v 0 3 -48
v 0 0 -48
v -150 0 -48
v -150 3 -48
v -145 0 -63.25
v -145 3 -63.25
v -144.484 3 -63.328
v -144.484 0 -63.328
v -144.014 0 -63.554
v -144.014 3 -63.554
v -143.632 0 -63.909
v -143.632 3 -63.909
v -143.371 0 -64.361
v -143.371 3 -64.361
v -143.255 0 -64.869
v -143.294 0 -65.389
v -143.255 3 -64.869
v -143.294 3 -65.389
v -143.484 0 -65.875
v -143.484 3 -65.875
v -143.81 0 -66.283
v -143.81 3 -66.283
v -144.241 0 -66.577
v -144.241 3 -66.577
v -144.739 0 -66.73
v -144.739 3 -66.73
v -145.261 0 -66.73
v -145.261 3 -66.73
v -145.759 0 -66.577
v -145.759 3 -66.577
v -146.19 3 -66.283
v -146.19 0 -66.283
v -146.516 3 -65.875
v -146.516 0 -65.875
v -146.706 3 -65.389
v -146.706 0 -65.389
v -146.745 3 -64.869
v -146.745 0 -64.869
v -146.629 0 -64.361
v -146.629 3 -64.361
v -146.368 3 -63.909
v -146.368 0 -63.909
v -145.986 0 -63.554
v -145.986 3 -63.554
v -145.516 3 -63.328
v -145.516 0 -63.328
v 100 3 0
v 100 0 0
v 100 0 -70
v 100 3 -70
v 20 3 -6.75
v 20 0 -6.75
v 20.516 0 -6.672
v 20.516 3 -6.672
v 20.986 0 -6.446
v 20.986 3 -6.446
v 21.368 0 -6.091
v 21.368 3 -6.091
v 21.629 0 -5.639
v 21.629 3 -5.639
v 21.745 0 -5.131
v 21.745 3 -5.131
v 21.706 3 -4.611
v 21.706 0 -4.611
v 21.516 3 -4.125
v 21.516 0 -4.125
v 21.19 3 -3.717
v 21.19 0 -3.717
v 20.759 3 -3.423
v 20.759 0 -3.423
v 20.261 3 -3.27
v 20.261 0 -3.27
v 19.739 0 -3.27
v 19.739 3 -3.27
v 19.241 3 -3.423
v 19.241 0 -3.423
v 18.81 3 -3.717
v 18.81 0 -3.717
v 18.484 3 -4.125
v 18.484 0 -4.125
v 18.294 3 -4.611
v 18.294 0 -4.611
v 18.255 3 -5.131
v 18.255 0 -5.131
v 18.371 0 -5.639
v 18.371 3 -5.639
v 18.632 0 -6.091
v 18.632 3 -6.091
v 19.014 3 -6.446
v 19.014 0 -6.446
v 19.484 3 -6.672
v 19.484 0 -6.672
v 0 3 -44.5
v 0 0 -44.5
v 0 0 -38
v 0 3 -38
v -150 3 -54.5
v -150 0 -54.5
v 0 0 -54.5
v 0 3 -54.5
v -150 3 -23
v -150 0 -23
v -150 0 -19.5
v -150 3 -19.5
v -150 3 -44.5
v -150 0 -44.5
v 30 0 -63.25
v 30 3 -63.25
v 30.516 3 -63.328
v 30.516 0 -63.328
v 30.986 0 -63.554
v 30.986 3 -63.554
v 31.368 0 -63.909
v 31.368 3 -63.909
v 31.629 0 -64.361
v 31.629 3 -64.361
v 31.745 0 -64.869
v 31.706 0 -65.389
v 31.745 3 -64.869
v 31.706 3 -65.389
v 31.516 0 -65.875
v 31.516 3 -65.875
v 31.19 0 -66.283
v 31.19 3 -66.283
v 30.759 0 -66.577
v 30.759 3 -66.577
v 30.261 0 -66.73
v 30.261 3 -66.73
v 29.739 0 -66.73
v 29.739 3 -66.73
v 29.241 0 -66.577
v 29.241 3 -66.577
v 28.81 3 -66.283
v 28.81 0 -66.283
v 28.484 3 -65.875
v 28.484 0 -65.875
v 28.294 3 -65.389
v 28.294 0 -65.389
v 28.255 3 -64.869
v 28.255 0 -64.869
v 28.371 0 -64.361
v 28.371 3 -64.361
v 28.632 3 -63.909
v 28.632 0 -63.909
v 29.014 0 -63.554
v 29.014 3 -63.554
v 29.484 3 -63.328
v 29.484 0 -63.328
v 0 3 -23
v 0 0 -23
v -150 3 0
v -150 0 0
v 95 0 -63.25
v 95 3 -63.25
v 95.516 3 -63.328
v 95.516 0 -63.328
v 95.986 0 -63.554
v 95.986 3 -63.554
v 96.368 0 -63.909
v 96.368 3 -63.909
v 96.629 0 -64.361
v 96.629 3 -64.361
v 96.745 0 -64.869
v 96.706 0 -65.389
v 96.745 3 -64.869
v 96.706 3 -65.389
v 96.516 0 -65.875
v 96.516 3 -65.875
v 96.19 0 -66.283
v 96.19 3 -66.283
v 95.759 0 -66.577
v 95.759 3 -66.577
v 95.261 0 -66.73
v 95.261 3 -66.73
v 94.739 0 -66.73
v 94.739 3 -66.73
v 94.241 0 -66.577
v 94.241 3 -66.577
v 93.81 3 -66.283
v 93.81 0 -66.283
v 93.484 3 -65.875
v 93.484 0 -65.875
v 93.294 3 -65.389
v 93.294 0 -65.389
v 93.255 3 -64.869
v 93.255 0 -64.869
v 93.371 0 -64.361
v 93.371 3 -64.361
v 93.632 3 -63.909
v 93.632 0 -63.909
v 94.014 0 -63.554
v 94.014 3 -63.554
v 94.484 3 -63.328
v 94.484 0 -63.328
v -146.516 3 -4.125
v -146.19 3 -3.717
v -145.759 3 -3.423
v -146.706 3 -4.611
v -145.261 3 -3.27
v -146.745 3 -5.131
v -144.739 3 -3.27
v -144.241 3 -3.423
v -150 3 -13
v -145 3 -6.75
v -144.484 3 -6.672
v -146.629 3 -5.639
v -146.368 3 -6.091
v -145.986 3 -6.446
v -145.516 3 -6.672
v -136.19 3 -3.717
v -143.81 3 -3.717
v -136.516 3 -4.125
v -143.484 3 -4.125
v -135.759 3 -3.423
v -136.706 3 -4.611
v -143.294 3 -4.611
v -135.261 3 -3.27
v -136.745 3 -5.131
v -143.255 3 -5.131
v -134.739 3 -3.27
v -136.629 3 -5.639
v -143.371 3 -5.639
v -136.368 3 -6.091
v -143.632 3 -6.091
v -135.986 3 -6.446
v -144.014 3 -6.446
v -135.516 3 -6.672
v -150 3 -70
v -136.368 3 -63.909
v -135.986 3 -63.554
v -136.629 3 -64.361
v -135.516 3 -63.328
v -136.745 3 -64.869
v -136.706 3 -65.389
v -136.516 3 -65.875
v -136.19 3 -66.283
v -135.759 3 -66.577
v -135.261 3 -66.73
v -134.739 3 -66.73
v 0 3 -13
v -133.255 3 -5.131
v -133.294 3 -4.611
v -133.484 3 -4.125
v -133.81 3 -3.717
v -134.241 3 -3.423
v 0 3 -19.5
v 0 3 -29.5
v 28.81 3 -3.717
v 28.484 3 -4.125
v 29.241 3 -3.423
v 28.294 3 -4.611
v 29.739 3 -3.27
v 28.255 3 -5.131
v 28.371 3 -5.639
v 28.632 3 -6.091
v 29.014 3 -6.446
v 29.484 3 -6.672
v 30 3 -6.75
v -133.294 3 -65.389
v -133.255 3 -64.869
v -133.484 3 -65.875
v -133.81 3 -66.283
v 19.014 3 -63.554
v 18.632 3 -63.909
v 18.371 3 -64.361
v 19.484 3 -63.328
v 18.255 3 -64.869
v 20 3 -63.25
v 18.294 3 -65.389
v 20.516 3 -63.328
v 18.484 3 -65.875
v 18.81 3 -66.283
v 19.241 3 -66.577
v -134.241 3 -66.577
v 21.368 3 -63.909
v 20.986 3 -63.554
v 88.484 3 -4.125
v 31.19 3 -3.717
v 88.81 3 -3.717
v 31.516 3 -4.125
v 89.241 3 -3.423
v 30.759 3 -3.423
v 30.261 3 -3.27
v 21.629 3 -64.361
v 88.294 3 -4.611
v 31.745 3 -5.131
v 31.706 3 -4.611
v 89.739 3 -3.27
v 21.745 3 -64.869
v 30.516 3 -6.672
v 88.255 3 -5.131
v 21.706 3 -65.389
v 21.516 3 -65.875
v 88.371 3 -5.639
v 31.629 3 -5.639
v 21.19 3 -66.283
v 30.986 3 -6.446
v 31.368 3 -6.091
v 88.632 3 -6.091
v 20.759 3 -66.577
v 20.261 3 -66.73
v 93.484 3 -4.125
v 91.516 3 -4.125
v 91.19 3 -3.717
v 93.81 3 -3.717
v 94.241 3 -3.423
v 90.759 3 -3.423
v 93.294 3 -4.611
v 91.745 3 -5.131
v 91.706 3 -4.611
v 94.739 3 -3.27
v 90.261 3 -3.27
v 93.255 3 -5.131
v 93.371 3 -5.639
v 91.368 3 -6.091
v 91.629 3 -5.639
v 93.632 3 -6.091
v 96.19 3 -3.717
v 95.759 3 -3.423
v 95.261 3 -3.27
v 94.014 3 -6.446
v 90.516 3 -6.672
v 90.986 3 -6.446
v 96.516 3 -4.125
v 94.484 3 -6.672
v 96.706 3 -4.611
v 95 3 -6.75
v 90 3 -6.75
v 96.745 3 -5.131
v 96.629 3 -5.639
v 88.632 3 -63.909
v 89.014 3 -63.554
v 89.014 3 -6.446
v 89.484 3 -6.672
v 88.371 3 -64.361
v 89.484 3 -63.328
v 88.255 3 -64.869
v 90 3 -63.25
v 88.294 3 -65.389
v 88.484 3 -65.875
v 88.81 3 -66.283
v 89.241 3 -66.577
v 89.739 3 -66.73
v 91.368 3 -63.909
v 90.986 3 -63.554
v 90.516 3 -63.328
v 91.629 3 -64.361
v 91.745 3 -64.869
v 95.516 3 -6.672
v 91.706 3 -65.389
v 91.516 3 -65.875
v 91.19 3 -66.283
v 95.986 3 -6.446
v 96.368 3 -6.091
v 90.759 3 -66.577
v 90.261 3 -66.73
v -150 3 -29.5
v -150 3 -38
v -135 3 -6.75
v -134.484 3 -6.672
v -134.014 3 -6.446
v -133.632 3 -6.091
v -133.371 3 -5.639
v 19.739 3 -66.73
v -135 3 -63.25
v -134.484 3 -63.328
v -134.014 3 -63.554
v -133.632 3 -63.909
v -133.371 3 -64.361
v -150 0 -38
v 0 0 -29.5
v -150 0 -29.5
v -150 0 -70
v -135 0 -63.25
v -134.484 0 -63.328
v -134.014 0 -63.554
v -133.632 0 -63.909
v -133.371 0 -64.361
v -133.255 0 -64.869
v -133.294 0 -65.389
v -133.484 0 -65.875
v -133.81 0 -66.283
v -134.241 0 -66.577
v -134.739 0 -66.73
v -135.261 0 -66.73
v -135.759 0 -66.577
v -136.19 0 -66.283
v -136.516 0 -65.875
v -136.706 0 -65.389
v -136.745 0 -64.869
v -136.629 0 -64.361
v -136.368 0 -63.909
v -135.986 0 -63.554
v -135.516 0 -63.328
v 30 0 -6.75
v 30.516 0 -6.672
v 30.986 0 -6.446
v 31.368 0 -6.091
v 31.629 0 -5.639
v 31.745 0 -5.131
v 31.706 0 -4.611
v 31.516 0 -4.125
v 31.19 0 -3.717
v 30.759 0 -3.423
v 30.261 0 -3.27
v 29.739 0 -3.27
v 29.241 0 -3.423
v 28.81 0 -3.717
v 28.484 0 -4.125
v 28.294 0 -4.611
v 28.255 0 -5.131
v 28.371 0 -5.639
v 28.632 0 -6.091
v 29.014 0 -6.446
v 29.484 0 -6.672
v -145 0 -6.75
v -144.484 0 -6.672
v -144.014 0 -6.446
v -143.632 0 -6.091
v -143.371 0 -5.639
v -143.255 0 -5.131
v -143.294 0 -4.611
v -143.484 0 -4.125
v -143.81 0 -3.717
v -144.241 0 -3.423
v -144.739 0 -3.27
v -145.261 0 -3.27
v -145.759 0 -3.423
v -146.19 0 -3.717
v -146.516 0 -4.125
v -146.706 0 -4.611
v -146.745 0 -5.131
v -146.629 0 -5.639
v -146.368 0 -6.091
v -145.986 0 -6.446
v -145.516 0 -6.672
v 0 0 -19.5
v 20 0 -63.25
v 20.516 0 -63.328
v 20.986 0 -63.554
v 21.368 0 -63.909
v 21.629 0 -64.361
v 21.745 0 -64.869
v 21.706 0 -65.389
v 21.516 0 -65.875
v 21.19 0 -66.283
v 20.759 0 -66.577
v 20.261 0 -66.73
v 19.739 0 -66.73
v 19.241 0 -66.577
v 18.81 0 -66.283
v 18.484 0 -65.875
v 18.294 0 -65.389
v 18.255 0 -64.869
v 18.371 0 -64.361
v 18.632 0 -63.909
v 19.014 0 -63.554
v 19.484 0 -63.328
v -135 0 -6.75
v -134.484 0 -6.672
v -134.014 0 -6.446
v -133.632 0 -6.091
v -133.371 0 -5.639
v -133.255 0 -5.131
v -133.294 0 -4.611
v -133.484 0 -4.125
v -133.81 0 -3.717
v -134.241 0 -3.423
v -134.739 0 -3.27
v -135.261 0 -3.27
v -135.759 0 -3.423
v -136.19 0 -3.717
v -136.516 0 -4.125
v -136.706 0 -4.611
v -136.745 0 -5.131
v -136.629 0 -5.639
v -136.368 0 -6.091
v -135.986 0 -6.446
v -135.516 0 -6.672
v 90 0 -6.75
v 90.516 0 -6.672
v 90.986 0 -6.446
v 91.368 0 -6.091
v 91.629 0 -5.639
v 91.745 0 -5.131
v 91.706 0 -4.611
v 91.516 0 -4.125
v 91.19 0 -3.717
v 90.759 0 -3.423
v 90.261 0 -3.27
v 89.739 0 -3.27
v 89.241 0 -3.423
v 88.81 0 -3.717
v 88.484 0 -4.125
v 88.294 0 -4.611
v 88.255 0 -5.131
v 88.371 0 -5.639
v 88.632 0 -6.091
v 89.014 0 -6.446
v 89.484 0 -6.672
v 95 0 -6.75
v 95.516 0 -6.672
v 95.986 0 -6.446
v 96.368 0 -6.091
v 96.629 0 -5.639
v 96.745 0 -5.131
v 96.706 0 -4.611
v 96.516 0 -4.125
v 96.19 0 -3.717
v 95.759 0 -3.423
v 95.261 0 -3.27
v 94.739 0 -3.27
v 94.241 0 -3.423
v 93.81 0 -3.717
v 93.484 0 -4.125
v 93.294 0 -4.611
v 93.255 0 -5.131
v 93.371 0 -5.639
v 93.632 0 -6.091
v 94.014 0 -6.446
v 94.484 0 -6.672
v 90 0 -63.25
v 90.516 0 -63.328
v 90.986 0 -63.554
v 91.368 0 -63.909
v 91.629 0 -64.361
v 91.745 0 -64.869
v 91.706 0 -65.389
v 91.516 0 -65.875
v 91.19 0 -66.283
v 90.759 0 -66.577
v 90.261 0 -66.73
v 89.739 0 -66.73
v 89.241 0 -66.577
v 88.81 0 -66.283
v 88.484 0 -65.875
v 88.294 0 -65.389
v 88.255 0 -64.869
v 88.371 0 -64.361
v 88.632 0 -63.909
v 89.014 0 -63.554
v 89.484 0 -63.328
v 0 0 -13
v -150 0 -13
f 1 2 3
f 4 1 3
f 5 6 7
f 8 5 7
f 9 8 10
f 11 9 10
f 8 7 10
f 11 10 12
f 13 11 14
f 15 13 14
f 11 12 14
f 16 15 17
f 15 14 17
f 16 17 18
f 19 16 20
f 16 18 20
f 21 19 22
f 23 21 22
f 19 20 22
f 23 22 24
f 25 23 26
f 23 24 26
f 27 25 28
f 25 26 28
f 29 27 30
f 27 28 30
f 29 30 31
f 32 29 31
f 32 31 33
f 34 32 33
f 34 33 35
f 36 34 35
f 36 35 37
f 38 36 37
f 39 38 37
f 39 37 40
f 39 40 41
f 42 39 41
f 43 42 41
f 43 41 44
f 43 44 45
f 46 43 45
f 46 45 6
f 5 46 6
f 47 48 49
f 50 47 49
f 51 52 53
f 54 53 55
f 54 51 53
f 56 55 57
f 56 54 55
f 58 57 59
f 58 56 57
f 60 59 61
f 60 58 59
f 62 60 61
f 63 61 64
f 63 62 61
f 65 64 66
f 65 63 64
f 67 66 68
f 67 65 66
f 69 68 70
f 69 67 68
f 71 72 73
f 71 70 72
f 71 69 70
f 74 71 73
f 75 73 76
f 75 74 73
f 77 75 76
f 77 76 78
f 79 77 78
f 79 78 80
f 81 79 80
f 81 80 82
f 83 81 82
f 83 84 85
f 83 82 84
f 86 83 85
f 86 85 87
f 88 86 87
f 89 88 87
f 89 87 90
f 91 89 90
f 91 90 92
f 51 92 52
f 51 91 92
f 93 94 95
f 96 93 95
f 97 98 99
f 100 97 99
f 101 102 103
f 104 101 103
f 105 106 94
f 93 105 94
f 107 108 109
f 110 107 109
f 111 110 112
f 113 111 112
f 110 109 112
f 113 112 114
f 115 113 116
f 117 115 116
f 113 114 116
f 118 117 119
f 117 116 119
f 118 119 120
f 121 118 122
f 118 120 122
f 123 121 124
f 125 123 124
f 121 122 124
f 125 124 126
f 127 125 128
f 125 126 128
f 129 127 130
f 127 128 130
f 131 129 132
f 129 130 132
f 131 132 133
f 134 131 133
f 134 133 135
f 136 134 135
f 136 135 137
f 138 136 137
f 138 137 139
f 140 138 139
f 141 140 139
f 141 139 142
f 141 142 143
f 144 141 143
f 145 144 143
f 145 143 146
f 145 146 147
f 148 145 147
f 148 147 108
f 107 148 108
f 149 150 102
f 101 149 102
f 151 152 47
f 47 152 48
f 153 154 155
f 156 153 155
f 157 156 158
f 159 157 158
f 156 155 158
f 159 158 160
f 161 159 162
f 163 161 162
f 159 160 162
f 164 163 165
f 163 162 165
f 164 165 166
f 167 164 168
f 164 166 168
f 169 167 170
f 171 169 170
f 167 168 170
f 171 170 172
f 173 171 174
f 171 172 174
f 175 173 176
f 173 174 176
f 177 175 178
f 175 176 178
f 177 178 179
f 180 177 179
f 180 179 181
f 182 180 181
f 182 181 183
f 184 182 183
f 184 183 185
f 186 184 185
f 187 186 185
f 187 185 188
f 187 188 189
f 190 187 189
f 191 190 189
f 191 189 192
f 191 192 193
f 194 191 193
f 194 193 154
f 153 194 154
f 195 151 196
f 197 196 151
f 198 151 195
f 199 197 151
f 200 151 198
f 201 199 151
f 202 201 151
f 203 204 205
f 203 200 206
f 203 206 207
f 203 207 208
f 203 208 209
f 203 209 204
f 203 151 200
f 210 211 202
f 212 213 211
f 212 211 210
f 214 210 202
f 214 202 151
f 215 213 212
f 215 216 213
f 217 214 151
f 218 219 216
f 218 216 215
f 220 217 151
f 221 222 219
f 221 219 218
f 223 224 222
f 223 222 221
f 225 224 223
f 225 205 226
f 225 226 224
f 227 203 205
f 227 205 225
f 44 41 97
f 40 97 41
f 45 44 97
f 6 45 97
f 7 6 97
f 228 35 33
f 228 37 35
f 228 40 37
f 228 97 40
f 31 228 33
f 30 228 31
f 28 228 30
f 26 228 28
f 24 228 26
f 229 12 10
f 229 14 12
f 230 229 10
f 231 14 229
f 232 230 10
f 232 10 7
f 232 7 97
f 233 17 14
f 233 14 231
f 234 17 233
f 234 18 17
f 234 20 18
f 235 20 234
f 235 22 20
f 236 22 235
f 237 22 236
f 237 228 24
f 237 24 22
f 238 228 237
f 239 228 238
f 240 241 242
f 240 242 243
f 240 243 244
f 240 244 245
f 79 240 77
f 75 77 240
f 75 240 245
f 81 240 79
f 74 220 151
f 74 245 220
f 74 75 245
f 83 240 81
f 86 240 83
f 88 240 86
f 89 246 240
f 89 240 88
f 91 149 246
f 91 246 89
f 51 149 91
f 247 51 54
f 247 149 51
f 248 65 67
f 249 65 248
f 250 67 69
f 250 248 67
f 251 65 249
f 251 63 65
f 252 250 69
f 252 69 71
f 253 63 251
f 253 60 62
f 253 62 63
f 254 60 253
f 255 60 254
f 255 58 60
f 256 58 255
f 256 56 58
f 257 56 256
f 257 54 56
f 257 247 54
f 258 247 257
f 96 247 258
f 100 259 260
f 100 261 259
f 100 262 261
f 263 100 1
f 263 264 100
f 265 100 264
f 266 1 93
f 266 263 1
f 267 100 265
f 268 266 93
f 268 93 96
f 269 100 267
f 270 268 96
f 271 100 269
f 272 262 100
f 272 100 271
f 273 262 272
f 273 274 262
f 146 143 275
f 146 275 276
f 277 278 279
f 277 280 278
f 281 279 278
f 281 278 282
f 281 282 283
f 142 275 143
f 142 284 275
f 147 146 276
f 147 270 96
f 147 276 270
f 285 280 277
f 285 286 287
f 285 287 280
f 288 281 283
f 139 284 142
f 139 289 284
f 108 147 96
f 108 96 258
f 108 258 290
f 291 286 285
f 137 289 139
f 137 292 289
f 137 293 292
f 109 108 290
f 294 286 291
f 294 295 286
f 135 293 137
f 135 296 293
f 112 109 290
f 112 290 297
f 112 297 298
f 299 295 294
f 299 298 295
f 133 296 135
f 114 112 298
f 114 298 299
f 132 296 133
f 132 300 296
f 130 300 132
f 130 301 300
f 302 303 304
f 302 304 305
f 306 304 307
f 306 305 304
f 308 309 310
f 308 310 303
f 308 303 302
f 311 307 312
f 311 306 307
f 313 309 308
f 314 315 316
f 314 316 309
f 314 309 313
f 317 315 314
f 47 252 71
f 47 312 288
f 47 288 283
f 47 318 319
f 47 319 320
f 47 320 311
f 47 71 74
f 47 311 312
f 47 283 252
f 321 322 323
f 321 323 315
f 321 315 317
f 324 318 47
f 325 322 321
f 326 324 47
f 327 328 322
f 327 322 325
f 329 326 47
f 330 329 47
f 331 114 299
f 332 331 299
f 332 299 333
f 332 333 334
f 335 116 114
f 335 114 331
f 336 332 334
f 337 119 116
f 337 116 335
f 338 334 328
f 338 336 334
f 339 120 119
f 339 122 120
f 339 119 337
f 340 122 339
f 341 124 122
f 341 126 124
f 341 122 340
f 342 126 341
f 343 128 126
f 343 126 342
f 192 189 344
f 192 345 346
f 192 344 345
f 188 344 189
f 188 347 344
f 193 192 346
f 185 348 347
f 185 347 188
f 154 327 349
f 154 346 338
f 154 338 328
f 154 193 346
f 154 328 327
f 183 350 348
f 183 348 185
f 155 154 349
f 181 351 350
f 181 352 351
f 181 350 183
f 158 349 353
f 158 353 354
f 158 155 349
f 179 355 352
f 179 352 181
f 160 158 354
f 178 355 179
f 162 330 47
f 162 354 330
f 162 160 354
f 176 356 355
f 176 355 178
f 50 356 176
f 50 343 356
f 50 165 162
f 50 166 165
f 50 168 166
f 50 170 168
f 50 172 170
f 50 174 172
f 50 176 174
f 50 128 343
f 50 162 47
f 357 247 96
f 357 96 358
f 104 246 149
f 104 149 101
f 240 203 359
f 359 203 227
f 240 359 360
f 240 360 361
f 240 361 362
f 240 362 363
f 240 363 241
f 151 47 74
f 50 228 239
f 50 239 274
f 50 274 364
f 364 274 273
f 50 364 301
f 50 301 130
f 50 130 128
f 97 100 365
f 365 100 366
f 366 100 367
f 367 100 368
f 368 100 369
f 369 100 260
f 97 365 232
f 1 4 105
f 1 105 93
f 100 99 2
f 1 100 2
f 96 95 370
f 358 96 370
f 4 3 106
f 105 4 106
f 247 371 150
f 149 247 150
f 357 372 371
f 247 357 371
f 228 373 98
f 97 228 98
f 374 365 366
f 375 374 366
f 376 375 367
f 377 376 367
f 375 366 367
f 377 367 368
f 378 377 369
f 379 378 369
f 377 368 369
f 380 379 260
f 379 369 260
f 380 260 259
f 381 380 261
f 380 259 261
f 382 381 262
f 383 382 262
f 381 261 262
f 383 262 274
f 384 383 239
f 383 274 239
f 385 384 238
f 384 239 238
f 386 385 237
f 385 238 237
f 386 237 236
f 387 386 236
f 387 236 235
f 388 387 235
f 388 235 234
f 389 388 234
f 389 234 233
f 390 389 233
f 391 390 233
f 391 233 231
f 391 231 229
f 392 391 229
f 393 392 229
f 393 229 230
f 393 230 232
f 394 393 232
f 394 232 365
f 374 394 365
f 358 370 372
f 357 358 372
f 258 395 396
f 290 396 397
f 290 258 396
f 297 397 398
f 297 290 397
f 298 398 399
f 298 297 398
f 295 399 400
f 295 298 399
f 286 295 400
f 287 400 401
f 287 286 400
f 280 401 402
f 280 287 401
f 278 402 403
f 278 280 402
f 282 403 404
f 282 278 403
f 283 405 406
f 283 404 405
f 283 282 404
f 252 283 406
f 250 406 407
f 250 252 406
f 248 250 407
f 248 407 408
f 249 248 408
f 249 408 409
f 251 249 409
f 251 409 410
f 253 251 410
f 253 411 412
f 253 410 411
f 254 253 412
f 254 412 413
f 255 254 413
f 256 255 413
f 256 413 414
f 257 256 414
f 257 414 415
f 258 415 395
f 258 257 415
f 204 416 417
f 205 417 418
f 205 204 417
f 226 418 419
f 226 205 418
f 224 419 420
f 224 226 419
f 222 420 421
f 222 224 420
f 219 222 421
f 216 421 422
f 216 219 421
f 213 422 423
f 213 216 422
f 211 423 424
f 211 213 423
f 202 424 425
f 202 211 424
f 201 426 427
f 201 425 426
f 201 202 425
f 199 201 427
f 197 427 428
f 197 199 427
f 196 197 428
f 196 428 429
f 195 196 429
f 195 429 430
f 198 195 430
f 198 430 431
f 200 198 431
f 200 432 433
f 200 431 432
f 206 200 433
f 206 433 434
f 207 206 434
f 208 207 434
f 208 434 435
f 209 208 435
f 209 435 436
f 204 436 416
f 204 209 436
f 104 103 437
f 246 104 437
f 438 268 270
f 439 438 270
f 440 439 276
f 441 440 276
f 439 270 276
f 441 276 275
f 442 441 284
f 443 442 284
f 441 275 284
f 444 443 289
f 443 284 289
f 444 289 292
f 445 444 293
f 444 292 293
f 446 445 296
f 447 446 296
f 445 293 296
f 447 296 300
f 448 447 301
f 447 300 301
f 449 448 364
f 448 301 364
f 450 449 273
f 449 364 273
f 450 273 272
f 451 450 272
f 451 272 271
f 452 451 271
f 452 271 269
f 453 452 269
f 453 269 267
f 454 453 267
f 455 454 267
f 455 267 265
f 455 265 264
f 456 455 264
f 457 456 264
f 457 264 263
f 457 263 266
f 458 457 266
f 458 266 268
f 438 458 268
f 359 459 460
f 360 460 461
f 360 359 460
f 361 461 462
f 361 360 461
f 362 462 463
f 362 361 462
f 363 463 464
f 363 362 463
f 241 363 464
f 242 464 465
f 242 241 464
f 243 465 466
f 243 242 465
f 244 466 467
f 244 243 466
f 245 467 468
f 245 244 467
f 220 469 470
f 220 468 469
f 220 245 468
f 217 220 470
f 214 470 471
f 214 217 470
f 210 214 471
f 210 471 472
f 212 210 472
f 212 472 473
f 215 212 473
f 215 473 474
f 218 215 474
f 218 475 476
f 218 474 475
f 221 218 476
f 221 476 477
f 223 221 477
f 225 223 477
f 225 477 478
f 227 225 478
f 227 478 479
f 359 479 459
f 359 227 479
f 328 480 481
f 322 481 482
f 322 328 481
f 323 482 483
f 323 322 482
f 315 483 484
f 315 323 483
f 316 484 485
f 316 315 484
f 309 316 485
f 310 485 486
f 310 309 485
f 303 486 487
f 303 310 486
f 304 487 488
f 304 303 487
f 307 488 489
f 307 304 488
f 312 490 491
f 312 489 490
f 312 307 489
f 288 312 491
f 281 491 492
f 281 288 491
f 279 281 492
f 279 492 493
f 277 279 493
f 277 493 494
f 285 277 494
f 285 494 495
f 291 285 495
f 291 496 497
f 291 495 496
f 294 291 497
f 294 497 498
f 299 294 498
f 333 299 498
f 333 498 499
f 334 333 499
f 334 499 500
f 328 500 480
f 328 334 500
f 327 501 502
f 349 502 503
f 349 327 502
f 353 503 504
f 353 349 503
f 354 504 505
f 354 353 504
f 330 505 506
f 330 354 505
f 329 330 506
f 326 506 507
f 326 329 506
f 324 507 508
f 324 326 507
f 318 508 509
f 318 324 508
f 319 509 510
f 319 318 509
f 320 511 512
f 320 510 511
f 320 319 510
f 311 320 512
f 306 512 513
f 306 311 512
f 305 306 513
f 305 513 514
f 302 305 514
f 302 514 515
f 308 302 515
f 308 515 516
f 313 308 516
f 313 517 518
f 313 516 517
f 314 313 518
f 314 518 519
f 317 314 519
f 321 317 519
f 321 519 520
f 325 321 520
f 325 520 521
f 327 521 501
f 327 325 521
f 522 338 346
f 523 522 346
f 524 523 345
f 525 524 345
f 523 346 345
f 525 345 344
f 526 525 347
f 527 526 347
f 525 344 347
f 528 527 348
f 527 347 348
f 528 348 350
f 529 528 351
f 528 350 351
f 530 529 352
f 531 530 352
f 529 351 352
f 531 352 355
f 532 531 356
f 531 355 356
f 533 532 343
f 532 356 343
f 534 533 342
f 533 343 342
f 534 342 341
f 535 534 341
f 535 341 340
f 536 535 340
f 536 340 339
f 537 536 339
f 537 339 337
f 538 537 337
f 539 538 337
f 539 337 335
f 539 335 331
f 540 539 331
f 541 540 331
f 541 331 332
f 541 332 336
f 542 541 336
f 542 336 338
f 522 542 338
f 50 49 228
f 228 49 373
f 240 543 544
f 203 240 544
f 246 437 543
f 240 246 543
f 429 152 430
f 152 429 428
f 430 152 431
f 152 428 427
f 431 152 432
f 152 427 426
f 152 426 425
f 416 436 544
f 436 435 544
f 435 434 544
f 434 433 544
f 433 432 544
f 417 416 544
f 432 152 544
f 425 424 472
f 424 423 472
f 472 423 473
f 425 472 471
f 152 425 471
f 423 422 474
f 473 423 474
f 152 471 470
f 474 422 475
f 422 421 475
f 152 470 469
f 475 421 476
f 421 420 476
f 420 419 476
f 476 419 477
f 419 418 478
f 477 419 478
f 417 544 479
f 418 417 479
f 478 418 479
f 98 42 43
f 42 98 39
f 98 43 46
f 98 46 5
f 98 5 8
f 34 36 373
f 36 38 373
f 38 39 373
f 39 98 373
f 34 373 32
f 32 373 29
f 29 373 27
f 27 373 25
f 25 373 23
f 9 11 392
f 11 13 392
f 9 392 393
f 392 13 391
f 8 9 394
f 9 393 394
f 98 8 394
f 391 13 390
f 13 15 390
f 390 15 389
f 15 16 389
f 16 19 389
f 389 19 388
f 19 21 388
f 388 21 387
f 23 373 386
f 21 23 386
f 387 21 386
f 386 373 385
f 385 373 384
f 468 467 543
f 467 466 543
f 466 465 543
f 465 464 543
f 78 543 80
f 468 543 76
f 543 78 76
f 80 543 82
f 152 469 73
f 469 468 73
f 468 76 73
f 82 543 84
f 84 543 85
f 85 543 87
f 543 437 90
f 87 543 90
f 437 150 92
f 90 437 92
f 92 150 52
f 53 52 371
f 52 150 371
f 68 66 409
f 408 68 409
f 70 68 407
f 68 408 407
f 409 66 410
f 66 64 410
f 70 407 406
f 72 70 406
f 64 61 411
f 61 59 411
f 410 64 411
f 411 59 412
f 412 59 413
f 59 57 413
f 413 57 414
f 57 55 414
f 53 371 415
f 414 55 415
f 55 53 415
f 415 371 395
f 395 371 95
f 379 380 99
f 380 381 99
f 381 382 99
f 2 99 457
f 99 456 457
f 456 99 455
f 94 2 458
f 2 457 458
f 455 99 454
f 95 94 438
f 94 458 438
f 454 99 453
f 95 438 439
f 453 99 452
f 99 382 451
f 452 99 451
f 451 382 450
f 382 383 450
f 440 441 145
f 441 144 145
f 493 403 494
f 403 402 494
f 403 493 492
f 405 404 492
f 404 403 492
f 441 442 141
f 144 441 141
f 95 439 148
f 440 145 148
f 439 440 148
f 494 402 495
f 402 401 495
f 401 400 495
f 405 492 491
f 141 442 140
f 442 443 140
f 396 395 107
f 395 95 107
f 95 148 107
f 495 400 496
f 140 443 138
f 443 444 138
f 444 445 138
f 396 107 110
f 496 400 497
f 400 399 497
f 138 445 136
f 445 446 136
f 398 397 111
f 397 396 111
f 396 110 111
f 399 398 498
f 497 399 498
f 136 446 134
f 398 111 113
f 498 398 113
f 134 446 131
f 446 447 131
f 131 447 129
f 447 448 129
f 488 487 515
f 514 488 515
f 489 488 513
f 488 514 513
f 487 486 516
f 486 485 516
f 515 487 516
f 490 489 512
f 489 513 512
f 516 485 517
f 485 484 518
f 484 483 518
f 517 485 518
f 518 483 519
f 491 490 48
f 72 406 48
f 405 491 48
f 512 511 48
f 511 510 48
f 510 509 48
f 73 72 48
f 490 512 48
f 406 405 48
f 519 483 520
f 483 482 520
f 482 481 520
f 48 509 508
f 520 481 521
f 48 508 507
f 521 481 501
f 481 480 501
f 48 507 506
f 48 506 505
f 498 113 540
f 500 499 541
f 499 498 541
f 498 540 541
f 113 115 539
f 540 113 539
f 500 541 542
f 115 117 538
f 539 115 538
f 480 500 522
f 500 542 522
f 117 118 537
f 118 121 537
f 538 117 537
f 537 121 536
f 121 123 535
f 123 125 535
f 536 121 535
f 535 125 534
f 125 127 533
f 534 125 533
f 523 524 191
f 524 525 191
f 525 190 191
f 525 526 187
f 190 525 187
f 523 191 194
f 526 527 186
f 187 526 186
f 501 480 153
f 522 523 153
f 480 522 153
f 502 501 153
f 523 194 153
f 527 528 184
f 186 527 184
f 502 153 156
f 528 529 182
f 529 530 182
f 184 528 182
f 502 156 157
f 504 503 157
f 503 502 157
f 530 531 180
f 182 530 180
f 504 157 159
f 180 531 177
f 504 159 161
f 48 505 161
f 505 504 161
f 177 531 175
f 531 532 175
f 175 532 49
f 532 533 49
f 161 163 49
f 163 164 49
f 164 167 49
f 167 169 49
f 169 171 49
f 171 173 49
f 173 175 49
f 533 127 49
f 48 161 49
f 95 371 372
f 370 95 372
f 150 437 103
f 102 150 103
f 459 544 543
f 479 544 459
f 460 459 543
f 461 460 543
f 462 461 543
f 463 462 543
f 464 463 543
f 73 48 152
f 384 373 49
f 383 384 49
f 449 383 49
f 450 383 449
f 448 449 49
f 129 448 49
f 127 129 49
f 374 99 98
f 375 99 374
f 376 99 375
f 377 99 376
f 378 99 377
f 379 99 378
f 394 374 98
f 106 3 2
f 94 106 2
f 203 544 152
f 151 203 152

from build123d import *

# Parameters (mm, degrees)
BOSS_EXTRUDE1_DEPTH = 3
SKETCH2_R           = 1.75
CUT_EXTRUDE1_DEPTH  = 10
SKETCH3_R           = 1.75
CUT_EXTRUDE2_DEPTH  = 10


with BuildPart() as part:
    # Sketch1 → Boss-Extrude1 (new body)
    with BuildSketch(Plane(origin=(0, 0, 0), x_dir=(1, 0, 0), z_dir=(0, 1, 0))):
        Polygon((-150, 29.5), (0, 29.5), (0, 23), (-150, 23), (-150, 19.5), (0, 19.5), (0, 13), (-150, 13), (-150, 0), (0, 0), (100, 0), (100, 70), (-50, 70), (-150, 70), (-150, 54.5), (0, 54.5), (0, 48), (-150, 48), (-150, 44.5), (0, 44.5), (0, 38), (-150, 38), align=None)
    extrude(amount=BOSS_EXTRUDE1_DEPTH)

    # Sketch2 → Cut-Extrude1 (cut)
    with BuildSketch(Plane(origin=(0, 3, 0), x_dir=(1, 0, 0), z_dir=(0, 1, 0))):
        with Locations(Location((-145, 65, 0), (0, 0, 270))):
            Circle(SKETCH2_R)
        with Locations(Location((-135, 65, 0), (0, 0, 270))):
            Circle(SKETCH2_R)
        with Locations(Location((20, 65, 0), (0, 0, 270))):
            Circle(SKETCH2_R)
        with Locations(Location((30, 65, 0), (0, 0, 270))):
            Circle(SKETCH2_R)
    cut_extrude1 = extrude(amount=-CUT_EXTRUDE1_DEPTH, mode=Mode.SUBTRACT)

    # Sketch3 → Cut-Extrude2 (cut)
    with BuildSketch(Plane(origin=(0, 3, 0), x_dir=(1, 0, 0), z_dir=(0, 1, 0))):
        with Locations(Location((95, 65, 0), (0, 0, 270))):
            Circle(SKETCH3_R)
        with Locations(Location((90, 65, 0), (0, 0, 270))):
            Circle(SKETCH3_R)
    cut_extrude2 = extrude(amount=-CUT_EXTRUDE2_DEPTH, mode=Mode.SUBTRACT)

    # Mirror1: Cut-Extrude1, Cut-Extrude2 across plane
    add(cut_extrude1.mirror(Plane(origin=(0, 0, -35), x_dir=(1, 0, 0), z_dir=(0, 0, -1))), mode=Mode.SUBTRACT)
    add(cut_extrude2.mirror(Plane(origin=(0, 0, -35), x_dir=(1, 0, 0), z_dir=(0, 0, -1))), mode=Mode.SUBTRACT)


solid = part.part
